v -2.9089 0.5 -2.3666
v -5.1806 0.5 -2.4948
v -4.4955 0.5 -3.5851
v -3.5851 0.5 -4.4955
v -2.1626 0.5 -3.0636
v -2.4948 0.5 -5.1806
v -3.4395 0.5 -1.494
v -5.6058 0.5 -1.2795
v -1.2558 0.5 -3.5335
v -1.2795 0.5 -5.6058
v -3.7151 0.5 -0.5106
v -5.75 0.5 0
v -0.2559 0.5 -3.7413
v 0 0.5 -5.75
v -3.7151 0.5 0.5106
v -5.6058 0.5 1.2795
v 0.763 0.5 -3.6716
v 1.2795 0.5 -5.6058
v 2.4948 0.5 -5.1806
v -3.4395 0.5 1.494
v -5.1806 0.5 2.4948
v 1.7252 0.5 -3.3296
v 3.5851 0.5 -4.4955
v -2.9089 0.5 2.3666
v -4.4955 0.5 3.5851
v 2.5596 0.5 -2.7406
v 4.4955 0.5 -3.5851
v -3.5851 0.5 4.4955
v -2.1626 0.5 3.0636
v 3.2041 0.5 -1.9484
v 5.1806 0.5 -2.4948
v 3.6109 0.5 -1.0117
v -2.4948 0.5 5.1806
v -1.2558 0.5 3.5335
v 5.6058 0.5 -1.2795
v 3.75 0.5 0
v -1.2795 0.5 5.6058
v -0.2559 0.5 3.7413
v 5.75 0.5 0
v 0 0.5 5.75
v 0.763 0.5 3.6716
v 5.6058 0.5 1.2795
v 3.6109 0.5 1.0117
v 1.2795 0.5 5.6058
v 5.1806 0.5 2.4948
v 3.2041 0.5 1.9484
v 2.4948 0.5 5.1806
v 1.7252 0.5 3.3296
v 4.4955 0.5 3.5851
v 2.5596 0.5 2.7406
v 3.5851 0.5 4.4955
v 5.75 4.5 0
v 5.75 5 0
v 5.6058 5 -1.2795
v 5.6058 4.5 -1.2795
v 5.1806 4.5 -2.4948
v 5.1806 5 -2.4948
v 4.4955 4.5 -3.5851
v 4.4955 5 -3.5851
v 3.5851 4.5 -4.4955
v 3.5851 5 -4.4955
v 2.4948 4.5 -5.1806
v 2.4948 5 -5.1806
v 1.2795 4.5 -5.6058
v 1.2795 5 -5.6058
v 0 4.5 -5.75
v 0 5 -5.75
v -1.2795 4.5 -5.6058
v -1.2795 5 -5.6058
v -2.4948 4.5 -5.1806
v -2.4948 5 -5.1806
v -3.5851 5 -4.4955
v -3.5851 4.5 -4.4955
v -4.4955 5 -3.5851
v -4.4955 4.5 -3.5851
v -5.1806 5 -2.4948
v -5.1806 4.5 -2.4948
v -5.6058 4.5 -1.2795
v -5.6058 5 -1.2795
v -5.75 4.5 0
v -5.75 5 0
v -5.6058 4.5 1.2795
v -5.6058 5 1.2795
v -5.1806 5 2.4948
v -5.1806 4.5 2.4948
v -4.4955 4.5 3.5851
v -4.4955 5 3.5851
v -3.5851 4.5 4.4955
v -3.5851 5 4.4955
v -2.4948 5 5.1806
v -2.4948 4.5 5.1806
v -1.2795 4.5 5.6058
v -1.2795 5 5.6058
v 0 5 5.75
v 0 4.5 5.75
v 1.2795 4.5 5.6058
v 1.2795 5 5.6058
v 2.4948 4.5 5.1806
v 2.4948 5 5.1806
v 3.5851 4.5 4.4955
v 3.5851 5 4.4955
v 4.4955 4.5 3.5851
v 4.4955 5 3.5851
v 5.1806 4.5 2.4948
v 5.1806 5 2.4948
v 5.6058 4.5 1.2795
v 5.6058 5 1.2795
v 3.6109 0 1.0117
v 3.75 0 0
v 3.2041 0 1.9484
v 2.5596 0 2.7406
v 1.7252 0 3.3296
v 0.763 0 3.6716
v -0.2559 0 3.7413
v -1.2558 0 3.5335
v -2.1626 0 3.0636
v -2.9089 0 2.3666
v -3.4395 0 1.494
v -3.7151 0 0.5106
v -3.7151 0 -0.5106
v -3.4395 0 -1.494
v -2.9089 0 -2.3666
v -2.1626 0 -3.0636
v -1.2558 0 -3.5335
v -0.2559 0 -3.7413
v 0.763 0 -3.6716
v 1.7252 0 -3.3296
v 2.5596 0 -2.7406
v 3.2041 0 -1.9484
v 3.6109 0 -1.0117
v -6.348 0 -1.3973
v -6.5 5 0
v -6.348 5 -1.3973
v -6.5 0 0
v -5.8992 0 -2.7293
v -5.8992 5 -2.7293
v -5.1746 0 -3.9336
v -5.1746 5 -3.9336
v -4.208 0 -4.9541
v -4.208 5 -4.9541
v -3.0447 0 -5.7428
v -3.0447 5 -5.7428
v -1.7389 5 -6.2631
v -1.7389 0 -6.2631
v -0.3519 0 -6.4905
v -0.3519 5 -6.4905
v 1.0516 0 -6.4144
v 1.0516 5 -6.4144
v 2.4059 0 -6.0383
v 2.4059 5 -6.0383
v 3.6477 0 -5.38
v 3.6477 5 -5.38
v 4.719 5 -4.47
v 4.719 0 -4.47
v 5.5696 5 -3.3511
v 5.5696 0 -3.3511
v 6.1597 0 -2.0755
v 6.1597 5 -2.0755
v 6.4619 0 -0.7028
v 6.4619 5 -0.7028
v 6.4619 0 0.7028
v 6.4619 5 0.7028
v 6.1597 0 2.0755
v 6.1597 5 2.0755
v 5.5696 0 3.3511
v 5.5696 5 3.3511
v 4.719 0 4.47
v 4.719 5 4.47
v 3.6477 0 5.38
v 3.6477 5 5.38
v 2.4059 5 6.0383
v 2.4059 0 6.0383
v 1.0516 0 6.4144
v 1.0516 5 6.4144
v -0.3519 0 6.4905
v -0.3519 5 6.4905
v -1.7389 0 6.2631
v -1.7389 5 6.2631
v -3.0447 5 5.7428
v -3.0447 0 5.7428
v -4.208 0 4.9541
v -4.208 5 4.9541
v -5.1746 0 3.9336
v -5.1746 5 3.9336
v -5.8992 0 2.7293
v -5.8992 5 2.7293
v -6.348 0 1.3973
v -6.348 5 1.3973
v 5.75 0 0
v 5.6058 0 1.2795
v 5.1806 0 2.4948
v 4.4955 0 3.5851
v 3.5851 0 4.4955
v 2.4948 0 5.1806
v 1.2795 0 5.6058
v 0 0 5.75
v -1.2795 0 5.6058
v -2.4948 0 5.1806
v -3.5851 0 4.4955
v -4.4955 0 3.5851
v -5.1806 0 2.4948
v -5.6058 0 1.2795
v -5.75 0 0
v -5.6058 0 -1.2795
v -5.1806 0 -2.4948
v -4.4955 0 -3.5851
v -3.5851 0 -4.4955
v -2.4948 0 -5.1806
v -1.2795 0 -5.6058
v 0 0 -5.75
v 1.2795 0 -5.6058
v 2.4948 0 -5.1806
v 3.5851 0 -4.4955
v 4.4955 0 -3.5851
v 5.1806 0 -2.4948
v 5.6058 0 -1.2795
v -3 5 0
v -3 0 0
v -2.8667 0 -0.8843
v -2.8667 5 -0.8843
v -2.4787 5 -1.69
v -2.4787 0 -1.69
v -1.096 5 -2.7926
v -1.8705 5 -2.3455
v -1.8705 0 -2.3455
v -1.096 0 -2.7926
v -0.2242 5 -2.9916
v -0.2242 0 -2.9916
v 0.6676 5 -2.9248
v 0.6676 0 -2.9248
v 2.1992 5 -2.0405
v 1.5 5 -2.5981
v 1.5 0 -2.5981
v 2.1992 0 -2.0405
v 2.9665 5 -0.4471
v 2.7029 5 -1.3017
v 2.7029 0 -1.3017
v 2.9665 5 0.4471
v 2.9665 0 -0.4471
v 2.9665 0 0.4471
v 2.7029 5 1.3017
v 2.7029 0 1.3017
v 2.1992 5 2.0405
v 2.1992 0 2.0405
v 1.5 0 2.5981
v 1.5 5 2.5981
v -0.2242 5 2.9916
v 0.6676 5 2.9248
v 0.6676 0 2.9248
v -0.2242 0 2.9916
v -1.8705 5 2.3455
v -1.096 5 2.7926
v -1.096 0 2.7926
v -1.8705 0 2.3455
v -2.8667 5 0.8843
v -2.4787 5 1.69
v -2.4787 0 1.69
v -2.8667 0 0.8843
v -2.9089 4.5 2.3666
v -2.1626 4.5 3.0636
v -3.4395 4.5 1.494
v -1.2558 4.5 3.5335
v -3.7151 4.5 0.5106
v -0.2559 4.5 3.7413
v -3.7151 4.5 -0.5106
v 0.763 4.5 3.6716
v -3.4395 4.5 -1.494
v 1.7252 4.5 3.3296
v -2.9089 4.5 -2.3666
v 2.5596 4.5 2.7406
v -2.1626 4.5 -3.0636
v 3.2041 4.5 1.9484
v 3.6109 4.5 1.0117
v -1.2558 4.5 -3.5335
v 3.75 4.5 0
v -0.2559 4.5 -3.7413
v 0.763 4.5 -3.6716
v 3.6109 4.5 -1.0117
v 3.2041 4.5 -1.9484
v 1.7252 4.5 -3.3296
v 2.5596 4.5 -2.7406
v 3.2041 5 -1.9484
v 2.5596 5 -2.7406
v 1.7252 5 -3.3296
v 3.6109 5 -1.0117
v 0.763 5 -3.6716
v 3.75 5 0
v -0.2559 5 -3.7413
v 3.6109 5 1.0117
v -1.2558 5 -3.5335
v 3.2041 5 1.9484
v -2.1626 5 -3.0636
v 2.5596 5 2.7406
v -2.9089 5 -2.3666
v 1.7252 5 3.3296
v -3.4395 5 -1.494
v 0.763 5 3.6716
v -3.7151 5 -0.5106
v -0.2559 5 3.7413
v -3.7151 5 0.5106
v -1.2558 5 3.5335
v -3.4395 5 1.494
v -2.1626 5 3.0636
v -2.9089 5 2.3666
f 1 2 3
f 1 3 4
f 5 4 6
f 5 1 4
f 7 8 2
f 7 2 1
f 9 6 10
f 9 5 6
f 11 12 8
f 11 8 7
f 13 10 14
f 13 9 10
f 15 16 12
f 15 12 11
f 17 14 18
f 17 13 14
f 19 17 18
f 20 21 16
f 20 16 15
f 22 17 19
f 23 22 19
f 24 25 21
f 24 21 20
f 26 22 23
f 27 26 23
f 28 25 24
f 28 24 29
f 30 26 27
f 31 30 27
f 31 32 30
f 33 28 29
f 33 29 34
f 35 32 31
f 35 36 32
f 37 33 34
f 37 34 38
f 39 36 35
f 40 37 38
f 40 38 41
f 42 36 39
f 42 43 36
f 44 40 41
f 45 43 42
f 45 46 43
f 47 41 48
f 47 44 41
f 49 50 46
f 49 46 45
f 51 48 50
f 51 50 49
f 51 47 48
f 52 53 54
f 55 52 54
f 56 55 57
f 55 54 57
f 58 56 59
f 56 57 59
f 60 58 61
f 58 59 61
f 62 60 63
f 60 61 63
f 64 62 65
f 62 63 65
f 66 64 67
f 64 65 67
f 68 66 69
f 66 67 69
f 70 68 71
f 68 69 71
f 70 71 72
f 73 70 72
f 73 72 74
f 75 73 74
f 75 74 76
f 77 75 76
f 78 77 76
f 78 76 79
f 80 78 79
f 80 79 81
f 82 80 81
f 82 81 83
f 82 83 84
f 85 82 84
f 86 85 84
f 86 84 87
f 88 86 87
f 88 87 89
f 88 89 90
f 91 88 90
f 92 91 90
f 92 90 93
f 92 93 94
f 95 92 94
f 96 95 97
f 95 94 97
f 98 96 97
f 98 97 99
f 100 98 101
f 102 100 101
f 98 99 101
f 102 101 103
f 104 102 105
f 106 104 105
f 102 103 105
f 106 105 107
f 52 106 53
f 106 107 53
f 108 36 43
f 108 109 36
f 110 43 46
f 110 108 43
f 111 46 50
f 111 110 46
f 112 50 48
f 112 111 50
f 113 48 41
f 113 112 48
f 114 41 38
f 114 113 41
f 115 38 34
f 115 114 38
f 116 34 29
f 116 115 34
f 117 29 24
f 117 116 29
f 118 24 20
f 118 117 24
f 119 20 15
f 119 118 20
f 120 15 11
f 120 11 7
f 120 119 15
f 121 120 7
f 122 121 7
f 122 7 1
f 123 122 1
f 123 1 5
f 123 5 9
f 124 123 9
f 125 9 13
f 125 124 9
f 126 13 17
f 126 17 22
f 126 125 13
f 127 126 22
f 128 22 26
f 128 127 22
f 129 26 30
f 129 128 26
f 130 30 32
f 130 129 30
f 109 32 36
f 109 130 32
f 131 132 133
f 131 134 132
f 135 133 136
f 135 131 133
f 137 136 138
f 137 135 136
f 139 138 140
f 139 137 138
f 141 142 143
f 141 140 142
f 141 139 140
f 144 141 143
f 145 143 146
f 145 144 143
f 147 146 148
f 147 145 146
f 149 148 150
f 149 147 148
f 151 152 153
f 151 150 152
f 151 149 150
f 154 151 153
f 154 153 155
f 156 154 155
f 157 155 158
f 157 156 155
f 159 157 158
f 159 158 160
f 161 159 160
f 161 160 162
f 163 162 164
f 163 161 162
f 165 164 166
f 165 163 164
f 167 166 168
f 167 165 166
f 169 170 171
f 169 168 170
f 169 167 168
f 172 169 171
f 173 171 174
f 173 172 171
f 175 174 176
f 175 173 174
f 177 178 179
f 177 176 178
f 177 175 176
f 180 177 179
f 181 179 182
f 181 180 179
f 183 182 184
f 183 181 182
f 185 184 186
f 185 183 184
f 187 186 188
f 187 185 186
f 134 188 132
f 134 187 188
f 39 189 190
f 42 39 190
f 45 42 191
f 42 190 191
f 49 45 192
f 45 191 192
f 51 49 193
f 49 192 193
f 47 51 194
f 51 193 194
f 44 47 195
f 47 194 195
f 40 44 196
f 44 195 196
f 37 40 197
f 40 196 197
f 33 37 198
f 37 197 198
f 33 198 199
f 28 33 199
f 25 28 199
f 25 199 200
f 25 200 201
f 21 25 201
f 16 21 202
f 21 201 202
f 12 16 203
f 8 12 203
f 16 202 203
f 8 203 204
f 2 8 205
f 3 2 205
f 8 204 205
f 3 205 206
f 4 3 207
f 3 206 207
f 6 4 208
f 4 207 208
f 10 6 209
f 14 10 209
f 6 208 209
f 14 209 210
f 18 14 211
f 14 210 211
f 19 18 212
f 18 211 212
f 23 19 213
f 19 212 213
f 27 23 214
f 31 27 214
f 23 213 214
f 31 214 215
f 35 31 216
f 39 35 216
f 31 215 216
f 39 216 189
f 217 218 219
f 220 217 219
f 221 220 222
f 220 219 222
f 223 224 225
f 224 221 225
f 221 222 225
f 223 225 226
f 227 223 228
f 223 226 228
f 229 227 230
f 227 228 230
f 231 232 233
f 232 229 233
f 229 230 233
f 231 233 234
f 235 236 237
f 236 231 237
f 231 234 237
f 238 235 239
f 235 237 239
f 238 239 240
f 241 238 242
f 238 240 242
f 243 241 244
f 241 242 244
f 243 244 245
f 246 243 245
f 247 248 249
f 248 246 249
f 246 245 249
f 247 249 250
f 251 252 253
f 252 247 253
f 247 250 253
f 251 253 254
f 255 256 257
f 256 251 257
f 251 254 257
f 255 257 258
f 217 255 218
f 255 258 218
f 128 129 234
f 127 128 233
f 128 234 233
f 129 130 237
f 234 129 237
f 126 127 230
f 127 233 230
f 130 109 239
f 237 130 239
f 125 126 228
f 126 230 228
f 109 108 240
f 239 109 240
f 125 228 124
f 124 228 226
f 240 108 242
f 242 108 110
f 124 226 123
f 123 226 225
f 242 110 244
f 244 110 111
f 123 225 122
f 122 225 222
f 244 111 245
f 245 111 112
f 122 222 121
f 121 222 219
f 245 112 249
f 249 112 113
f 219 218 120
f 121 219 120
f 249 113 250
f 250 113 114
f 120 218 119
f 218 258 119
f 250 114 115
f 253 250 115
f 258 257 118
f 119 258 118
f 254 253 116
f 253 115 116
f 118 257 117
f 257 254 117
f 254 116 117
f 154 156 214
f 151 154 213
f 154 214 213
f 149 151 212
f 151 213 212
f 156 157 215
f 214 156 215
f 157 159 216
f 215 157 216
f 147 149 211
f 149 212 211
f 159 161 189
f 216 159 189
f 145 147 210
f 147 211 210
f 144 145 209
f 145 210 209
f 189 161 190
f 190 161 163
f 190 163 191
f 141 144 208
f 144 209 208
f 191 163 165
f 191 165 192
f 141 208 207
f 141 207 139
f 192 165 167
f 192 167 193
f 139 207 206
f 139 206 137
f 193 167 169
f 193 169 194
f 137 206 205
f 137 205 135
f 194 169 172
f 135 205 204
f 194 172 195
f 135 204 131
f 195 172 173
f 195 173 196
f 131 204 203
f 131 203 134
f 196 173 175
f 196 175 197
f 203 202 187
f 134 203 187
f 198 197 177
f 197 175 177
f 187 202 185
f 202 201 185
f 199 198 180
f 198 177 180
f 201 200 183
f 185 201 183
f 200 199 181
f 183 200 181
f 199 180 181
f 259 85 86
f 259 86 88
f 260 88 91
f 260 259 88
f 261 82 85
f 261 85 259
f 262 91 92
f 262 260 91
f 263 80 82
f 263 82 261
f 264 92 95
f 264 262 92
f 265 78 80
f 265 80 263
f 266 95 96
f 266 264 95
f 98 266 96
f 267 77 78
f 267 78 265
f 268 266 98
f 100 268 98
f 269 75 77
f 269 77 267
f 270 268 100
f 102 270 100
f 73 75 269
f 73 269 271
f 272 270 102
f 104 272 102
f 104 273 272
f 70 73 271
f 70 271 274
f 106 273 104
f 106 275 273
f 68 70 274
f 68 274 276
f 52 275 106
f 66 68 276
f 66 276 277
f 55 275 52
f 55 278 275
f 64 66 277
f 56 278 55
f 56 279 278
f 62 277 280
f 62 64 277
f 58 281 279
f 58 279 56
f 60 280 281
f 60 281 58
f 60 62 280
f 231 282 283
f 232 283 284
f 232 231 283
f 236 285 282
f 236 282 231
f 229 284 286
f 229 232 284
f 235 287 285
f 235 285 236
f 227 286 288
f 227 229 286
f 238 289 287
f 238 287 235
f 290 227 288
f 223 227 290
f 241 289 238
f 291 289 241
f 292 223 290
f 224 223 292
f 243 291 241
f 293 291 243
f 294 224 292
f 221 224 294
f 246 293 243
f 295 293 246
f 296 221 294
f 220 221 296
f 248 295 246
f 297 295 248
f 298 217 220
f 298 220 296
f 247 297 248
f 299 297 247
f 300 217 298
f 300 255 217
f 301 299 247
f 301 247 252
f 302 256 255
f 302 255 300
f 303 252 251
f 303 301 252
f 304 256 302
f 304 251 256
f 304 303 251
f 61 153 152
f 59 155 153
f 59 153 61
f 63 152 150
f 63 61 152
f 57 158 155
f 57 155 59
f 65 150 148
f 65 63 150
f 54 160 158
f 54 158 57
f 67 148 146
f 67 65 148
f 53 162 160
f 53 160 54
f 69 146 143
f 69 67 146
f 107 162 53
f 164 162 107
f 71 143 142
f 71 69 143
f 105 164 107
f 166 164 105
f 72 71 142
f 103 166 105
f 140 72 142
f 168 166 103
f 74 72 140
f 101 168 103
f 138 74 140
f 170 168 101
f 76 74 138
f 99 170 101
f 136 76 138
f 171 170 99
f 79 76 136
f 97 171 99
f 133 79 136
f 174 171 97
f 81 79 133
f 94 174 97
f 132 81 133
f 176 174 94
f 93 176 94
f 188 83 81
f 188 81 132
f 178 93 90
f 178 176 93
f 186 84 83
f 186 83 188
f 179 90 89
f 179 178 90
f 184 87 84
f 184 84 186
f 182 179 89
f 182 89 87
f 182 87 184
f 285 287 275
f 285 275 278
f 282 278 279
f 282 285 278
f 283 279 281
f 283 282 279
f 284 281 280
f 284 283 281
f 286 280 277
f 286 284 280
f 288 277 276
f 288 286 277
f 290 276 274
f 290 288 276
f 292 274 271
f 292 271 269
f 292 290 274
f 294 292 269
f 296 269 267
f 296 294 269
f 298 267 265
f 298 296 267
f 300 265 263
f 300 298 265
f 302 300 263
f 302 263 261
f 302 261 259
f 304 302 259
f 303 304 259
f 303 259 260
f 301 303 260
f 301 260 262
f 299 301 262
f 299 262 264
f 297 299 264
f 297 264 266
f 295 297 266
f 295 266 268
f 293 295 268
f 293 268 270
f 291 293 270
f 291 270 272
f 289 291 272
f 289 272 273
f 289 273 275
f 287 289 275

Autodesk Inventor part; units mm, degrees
ref_plane "YZ Plane" through (0, 0, 0) normal (1, 0, 0) x (0, 1, 0)
ref_plane "XZ Plane" through (0, 0, 0) normal (0, 1, 0) x (-1, 0, 0)
ref_plane "XY Plane" through (0, 0, 0) normal (0, 0, 1) x (1, 0, 0)
sketch "草图1" plane through (0, 0, 0) normal (0, 1, 0) x (-1, 0, 0)
  circle A0 centre (0, 0) radius 6.5
  circle A1 centre (0, 0) radius 3
  dimension "d0" = 13
  dimension "d1" = 6
extrude "拉伸1" add sketch "草图1" along normal blind 5
sketch "草图2" plane through (0, 5, 0) normal (0, 1, 0) x (1, 0, 0)
  circle A0 centre (0, 0) radius 3 projected
  circle A1 centre (0, 0) radius 6.5 projected
  circle A2 centre (0, 0) radius 3.75
  circle A3 centre (0, 0) radius 5.75
  dimension "d4" = 11.5
  dimension "d5" = 7.5
extrude "拉伸2" cut sketch "草图2" against normal blind 0.5 contours A3
sketch "草图3" plane through (0, 0, 0) normal (0, -1, 0) x (1, 0, 0)
  circle A0 centre (0, 0) radius 3.75 projected
  circle A1 centre (0, 0) radius 5.75 projected
extrude "拉伸3" cut sketch "草图3" against normal blind 0.5
properties part number "bearing_6_13_5"
